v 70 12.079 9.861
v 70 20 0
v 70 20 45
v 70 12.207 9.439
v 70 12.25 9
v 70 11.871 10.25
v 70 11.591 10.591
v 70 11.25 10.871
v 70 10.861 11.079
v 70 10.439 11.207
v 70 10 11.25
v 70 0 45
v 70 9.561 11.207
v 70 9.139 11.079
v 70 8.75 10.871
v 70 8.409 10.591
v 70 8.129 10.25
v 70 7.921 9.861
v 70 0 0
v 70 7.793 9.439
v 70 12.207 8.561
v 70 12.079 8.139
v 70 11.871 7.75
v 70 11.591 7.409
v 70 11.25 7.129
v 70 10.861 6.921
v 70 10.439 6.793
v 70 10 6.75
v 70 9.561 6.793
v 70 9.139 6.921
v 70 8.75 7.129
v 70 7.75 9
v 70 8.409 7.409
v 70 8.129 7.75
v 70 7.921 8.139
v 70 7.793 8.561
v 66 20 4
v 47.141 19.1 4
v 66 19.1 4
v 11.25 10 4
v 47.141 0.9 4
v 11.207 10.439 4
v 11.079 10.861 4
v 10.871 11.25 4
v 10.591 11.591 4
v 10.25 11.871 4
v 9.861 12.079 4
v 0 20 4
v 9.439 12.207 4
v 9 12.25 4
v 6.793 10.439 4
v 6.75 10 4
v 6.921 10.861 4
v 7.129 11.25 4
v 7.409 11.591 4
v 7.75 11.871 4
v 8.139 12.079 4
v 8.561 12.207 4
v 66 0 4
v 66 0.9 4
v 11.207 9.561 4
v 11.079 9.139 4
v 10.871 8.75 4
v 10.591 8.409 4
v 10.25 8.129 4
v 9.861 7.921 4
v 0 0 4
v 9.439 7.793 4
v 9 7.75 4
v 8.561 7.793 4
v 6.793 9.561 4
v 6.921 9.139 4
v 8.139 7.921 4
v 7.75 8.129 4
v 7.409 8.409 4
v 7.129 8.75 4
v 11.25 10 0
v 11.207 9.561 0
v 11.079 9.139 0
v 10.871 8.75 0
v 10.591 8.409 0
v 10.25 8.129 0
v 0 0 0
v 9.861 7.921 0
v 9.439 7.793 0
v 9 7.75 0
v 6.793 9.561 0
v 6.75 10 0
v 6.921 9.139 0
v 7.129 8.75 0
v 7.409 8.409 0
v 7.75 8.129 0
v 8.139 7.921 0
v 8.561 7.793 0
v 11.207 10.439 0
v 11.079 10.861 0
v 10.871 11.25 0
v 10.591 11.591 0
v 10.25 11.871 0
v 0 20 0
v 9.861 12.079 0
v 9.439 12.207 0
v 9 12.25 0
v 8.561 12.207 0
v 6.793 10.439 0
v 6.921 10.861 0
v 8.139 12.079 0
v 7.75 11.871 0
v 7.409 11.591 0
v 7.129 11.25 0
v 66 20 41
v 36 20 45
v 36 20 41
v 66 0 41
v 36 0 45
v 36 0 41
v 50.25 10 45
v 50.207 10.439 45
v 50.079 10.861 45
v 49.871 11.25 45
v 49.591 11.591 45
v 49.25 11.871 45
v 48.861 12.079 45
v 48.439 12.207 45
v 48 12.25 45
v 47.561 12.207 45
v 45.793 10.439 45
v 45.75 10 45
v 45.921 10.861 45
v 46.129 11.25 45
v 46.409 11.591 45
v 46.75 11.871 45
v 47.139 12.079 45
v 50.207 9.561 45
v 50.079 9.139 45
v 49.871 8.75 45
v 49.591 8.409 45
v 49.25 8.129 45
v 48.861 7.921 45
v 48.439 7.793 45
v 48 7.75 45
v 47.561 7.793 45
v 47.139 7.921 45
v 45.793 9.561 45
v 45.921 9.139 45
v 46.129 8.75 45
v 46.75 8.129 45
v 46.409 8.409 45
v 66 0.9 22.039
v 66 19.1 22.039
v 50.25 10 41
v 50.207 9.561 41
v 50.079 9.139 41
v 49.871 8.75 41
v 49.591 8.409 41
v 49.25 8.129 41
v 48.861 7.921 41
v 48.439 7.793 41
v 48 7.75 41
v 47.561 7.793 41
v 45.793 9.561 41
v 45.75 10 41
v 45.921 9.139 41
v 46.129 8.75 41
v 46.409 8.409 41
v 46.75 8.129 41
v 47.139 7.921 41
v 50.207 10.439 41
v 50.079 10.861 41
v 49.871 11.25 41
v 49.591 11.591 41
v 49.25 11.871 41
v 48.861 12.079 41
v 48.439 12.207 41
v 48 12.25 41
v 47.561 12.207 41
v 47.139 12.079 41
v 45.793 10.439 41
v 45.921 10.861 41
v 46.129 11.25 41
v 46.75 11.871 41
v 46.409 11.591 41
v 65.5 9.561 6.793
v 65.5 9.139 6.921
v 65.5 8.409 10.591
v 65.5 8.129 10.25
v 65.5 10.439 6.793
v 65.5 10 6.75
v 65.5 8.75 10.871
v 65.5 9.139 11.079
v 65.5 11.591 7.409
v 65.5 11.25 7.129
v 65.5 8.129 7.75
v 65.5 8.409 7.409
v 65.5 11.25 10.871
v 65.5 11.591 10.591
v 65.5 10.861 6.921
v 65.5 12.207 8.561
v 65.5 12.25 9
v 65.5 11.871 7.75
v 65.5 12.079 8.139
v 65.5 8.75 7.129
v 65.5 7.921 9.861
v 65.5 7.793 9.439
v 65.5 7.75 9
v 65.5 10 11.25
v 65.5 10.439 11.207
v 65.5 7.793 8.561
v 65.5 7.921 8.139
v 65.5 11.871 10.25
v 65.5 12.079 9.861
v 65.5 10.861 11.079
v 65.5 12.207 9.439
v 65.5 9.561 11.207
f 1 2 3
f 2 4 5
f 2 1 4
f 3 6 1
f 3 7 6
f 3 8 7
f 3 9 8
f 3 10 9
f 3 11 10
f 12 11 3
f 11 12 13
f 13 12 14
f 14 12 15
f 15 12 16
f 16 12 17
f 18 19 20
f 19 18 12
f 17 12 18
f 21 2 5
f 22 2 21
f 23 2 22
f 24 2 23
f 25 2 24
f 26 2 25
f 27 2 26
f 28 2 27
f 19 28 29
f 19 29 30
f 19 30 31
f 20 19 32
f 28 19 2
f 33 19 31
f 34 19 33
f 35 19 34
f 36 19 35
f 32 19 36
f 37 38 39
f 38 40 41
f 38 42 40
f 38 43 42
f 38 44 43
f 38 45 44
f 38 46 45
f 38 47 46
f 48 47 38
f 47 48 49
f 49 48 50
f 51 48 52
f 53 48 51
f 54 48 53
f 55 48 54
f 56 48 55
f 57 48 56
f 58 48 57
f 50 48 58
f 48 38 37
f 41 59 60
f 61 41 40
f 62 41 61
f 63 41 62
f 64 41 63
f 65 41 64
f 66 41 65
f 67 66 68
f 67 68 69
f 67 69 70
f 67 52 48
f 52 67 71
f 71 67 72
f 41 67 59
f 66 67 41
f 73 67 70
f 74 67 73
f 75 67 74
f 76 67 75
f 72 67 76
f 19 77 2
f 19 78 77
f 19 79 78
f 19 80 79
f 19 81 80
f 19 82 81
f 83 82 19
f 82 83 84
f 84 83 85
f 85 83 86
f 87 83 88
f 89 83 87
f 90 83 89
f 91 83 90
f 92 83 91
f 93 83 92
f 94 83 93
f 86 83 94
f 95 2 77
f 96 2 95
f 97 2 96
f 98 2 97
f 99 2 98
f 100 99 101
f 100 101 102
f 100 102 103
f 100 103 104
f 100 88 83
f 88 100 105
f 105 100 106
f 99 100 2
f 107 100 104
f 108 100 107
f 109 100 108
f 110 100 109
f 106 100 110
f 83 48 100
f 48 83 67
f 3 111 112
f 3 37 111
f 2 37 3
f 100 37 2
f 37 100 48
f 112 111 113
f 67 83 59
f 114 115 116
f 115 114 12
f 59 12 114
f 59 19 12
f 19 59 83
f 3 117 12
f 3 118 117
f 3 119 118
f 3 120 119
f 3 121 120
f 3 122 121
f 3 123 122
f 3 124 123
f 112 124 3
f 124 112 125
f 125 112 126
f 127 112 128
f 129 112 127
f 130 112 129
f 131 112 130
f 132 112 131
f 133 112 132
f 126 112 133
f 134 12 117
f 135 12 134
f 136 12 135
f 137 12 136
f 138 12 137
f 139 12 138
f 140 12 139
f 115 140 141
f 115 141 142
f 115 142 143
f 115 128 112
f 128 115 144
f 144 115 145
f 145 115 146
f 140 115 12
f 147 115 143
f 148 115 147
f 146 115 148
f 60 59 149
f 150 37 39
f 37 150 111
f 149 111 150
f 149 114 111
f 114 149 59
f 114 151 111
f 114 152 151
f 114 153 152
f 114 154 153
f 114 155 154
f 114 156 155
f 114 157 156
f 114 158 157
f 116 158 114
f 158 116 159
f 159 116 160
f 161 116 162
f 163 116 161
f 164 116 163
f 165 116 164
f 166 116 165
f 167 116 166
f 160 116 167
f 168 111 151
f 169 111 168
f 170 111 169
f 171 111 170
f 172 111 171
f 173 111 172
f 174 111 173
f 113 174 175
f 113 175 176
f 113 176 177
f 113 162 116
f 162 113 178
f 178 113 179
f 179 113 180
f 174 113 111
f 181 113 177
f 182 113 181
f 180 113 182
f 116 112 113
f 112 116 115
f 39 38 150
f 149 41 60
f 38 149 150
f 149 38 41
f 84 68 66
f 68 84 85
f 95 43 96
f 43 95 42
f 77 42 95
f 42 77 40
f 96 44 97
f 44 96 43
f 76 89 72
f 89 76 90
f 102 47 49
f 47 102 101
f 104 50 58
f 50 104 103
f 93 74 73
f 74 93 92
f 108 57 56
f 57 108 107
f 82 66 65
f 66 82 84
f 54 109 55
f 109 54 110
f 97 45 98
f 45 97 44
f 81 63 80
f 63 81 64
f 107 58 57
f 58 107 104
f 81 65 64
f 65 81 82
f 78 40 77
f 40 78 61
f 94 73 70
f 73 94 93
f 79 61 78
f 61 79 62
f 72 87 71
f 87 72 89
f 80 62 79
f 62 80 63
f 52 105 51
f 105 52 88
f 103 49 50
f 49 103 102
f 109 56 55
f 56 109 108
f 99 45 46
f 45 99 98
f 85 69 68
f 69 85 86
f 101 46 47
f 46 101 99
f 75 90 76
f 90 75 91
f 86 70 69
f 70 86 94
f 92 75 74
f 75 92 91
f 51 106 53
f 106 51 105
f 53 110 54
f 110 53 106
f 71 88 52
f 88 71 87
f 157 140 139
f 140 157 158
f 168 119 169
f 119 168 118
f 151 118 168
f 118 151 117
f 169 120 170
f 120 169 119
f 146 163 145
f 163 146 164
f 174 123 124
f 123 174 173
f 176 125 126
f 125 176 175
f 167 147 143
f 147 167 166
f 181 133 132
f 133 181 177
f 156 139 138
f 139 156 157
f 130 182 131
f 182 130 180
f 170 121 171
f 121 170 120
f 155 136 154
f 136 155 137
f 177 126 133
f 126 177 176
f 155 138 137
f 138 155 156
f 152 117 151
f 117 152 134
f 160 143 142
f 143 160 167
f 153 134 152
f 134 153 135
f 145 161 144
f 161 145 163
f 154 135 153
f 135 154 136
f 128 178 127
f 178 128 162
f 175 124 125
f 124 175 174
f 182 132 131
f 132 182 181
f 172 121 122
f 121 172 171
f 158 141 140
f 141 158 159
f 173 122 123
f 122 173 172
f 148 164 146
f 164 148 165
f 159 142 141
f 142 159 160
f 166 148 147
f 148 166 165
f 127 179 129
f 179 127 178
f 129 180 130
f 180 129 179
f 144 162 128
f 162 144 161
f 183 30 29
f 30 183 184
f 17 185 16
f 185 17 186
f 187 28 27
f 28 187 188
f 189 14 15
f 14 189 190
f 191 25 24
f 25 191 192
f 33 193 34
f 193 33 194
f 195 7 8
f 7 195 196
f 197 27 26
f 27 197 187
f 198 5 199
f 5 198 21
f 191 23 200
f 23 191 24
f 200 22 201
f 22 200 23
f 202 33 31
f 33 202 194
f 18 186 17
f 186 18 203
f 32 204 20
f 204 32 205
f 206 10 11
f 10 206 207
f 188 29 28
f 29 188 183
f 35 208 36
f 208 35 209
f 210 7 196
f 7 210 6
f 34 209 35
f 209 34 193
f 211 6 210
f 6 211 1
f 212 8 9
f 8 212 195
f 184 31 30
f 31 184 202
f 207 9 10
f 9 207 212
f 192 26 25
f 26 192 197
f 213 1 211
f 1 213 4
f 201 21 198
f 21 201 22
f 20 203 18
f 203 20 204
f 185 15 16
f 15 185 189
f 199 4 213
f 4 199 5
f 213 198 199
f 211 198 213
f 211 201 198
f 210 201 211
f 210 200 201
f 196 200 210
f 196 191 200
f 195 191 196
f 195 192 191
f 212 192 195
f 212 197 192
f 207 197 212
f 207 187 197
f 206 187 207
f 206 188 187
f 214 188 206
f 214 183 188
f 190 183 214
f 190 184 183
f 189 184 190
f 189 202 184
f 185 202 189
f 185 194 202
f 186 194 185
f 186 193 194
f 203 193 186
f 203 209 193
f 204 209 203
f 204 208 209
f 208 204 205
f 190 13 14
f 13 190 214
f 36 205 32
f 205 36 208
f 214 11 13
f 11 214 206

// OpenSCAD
$fn = 32;

// ----------------------------------------------------------------------
// Z-bracket: 70 x 20 x 45 mm
// ----------------------------------------------------------------------

// --- parameters (mm) ---
foot_len = 70;            // lower foot length, X
top_len = 30;             // upper foot length, X
depth = 20;               // bracket width, Y
step_h = 45;              // overall rise, Z
plate_t = 4;              // plate thickness
hole_d = 4.5;             // clearance for M4
rib_len = 19.8;           // gusset leg
rib_sink = 0.9;           // gusset overlap into the plates

module hole_z(px, py, z0) {
  translate([px, py, z0 - 0.5]) cylinder(h = plate_t + 1, d = hole_d);
}
module hole_x(py, pz) {
  translate([-0.5, py, pz]) rotate([0, 90, 0]) cylinder(h = plate_t + 1, d = hole_d);
}
module gusset(x0) {
  translate([x0, depth - rib_sink, 0])
    rotate([90, 0, 0])
      linear_extrude(height = depth - 2 * rib_sink)
        polygon(points = [[rib_sink, plate_t - rib_sink],
                          [rib_sink, plate_t - rib_sink + rib_len],
                          [-rib_len, plate_t - rib_sink]]);
}

difference() {
  union() {
    cube([foot_len, depth, plate_t]);
    /* web, overlapping the lower foot */
    translate([foot_len - plate_t, 0, 0]) cube([plate_t, depth, step_h]);
    /* upper foot, sunk into the web */
    translate([foot_len - plate_t - top_len, 0, step_h - plate_t]) cube([top_len + plate_t, depth, plate_t]);
    gusset(foot_len - plate_t);
  }
  hole_z(9, 10, 0);
  translate([foot_len - plate_t - 18, 0, 0]) hole_z(0, 10, step_h - plate_t);
  translate([foot_len - plate_t, 0, 0]) hole_x(10, 9);
}
